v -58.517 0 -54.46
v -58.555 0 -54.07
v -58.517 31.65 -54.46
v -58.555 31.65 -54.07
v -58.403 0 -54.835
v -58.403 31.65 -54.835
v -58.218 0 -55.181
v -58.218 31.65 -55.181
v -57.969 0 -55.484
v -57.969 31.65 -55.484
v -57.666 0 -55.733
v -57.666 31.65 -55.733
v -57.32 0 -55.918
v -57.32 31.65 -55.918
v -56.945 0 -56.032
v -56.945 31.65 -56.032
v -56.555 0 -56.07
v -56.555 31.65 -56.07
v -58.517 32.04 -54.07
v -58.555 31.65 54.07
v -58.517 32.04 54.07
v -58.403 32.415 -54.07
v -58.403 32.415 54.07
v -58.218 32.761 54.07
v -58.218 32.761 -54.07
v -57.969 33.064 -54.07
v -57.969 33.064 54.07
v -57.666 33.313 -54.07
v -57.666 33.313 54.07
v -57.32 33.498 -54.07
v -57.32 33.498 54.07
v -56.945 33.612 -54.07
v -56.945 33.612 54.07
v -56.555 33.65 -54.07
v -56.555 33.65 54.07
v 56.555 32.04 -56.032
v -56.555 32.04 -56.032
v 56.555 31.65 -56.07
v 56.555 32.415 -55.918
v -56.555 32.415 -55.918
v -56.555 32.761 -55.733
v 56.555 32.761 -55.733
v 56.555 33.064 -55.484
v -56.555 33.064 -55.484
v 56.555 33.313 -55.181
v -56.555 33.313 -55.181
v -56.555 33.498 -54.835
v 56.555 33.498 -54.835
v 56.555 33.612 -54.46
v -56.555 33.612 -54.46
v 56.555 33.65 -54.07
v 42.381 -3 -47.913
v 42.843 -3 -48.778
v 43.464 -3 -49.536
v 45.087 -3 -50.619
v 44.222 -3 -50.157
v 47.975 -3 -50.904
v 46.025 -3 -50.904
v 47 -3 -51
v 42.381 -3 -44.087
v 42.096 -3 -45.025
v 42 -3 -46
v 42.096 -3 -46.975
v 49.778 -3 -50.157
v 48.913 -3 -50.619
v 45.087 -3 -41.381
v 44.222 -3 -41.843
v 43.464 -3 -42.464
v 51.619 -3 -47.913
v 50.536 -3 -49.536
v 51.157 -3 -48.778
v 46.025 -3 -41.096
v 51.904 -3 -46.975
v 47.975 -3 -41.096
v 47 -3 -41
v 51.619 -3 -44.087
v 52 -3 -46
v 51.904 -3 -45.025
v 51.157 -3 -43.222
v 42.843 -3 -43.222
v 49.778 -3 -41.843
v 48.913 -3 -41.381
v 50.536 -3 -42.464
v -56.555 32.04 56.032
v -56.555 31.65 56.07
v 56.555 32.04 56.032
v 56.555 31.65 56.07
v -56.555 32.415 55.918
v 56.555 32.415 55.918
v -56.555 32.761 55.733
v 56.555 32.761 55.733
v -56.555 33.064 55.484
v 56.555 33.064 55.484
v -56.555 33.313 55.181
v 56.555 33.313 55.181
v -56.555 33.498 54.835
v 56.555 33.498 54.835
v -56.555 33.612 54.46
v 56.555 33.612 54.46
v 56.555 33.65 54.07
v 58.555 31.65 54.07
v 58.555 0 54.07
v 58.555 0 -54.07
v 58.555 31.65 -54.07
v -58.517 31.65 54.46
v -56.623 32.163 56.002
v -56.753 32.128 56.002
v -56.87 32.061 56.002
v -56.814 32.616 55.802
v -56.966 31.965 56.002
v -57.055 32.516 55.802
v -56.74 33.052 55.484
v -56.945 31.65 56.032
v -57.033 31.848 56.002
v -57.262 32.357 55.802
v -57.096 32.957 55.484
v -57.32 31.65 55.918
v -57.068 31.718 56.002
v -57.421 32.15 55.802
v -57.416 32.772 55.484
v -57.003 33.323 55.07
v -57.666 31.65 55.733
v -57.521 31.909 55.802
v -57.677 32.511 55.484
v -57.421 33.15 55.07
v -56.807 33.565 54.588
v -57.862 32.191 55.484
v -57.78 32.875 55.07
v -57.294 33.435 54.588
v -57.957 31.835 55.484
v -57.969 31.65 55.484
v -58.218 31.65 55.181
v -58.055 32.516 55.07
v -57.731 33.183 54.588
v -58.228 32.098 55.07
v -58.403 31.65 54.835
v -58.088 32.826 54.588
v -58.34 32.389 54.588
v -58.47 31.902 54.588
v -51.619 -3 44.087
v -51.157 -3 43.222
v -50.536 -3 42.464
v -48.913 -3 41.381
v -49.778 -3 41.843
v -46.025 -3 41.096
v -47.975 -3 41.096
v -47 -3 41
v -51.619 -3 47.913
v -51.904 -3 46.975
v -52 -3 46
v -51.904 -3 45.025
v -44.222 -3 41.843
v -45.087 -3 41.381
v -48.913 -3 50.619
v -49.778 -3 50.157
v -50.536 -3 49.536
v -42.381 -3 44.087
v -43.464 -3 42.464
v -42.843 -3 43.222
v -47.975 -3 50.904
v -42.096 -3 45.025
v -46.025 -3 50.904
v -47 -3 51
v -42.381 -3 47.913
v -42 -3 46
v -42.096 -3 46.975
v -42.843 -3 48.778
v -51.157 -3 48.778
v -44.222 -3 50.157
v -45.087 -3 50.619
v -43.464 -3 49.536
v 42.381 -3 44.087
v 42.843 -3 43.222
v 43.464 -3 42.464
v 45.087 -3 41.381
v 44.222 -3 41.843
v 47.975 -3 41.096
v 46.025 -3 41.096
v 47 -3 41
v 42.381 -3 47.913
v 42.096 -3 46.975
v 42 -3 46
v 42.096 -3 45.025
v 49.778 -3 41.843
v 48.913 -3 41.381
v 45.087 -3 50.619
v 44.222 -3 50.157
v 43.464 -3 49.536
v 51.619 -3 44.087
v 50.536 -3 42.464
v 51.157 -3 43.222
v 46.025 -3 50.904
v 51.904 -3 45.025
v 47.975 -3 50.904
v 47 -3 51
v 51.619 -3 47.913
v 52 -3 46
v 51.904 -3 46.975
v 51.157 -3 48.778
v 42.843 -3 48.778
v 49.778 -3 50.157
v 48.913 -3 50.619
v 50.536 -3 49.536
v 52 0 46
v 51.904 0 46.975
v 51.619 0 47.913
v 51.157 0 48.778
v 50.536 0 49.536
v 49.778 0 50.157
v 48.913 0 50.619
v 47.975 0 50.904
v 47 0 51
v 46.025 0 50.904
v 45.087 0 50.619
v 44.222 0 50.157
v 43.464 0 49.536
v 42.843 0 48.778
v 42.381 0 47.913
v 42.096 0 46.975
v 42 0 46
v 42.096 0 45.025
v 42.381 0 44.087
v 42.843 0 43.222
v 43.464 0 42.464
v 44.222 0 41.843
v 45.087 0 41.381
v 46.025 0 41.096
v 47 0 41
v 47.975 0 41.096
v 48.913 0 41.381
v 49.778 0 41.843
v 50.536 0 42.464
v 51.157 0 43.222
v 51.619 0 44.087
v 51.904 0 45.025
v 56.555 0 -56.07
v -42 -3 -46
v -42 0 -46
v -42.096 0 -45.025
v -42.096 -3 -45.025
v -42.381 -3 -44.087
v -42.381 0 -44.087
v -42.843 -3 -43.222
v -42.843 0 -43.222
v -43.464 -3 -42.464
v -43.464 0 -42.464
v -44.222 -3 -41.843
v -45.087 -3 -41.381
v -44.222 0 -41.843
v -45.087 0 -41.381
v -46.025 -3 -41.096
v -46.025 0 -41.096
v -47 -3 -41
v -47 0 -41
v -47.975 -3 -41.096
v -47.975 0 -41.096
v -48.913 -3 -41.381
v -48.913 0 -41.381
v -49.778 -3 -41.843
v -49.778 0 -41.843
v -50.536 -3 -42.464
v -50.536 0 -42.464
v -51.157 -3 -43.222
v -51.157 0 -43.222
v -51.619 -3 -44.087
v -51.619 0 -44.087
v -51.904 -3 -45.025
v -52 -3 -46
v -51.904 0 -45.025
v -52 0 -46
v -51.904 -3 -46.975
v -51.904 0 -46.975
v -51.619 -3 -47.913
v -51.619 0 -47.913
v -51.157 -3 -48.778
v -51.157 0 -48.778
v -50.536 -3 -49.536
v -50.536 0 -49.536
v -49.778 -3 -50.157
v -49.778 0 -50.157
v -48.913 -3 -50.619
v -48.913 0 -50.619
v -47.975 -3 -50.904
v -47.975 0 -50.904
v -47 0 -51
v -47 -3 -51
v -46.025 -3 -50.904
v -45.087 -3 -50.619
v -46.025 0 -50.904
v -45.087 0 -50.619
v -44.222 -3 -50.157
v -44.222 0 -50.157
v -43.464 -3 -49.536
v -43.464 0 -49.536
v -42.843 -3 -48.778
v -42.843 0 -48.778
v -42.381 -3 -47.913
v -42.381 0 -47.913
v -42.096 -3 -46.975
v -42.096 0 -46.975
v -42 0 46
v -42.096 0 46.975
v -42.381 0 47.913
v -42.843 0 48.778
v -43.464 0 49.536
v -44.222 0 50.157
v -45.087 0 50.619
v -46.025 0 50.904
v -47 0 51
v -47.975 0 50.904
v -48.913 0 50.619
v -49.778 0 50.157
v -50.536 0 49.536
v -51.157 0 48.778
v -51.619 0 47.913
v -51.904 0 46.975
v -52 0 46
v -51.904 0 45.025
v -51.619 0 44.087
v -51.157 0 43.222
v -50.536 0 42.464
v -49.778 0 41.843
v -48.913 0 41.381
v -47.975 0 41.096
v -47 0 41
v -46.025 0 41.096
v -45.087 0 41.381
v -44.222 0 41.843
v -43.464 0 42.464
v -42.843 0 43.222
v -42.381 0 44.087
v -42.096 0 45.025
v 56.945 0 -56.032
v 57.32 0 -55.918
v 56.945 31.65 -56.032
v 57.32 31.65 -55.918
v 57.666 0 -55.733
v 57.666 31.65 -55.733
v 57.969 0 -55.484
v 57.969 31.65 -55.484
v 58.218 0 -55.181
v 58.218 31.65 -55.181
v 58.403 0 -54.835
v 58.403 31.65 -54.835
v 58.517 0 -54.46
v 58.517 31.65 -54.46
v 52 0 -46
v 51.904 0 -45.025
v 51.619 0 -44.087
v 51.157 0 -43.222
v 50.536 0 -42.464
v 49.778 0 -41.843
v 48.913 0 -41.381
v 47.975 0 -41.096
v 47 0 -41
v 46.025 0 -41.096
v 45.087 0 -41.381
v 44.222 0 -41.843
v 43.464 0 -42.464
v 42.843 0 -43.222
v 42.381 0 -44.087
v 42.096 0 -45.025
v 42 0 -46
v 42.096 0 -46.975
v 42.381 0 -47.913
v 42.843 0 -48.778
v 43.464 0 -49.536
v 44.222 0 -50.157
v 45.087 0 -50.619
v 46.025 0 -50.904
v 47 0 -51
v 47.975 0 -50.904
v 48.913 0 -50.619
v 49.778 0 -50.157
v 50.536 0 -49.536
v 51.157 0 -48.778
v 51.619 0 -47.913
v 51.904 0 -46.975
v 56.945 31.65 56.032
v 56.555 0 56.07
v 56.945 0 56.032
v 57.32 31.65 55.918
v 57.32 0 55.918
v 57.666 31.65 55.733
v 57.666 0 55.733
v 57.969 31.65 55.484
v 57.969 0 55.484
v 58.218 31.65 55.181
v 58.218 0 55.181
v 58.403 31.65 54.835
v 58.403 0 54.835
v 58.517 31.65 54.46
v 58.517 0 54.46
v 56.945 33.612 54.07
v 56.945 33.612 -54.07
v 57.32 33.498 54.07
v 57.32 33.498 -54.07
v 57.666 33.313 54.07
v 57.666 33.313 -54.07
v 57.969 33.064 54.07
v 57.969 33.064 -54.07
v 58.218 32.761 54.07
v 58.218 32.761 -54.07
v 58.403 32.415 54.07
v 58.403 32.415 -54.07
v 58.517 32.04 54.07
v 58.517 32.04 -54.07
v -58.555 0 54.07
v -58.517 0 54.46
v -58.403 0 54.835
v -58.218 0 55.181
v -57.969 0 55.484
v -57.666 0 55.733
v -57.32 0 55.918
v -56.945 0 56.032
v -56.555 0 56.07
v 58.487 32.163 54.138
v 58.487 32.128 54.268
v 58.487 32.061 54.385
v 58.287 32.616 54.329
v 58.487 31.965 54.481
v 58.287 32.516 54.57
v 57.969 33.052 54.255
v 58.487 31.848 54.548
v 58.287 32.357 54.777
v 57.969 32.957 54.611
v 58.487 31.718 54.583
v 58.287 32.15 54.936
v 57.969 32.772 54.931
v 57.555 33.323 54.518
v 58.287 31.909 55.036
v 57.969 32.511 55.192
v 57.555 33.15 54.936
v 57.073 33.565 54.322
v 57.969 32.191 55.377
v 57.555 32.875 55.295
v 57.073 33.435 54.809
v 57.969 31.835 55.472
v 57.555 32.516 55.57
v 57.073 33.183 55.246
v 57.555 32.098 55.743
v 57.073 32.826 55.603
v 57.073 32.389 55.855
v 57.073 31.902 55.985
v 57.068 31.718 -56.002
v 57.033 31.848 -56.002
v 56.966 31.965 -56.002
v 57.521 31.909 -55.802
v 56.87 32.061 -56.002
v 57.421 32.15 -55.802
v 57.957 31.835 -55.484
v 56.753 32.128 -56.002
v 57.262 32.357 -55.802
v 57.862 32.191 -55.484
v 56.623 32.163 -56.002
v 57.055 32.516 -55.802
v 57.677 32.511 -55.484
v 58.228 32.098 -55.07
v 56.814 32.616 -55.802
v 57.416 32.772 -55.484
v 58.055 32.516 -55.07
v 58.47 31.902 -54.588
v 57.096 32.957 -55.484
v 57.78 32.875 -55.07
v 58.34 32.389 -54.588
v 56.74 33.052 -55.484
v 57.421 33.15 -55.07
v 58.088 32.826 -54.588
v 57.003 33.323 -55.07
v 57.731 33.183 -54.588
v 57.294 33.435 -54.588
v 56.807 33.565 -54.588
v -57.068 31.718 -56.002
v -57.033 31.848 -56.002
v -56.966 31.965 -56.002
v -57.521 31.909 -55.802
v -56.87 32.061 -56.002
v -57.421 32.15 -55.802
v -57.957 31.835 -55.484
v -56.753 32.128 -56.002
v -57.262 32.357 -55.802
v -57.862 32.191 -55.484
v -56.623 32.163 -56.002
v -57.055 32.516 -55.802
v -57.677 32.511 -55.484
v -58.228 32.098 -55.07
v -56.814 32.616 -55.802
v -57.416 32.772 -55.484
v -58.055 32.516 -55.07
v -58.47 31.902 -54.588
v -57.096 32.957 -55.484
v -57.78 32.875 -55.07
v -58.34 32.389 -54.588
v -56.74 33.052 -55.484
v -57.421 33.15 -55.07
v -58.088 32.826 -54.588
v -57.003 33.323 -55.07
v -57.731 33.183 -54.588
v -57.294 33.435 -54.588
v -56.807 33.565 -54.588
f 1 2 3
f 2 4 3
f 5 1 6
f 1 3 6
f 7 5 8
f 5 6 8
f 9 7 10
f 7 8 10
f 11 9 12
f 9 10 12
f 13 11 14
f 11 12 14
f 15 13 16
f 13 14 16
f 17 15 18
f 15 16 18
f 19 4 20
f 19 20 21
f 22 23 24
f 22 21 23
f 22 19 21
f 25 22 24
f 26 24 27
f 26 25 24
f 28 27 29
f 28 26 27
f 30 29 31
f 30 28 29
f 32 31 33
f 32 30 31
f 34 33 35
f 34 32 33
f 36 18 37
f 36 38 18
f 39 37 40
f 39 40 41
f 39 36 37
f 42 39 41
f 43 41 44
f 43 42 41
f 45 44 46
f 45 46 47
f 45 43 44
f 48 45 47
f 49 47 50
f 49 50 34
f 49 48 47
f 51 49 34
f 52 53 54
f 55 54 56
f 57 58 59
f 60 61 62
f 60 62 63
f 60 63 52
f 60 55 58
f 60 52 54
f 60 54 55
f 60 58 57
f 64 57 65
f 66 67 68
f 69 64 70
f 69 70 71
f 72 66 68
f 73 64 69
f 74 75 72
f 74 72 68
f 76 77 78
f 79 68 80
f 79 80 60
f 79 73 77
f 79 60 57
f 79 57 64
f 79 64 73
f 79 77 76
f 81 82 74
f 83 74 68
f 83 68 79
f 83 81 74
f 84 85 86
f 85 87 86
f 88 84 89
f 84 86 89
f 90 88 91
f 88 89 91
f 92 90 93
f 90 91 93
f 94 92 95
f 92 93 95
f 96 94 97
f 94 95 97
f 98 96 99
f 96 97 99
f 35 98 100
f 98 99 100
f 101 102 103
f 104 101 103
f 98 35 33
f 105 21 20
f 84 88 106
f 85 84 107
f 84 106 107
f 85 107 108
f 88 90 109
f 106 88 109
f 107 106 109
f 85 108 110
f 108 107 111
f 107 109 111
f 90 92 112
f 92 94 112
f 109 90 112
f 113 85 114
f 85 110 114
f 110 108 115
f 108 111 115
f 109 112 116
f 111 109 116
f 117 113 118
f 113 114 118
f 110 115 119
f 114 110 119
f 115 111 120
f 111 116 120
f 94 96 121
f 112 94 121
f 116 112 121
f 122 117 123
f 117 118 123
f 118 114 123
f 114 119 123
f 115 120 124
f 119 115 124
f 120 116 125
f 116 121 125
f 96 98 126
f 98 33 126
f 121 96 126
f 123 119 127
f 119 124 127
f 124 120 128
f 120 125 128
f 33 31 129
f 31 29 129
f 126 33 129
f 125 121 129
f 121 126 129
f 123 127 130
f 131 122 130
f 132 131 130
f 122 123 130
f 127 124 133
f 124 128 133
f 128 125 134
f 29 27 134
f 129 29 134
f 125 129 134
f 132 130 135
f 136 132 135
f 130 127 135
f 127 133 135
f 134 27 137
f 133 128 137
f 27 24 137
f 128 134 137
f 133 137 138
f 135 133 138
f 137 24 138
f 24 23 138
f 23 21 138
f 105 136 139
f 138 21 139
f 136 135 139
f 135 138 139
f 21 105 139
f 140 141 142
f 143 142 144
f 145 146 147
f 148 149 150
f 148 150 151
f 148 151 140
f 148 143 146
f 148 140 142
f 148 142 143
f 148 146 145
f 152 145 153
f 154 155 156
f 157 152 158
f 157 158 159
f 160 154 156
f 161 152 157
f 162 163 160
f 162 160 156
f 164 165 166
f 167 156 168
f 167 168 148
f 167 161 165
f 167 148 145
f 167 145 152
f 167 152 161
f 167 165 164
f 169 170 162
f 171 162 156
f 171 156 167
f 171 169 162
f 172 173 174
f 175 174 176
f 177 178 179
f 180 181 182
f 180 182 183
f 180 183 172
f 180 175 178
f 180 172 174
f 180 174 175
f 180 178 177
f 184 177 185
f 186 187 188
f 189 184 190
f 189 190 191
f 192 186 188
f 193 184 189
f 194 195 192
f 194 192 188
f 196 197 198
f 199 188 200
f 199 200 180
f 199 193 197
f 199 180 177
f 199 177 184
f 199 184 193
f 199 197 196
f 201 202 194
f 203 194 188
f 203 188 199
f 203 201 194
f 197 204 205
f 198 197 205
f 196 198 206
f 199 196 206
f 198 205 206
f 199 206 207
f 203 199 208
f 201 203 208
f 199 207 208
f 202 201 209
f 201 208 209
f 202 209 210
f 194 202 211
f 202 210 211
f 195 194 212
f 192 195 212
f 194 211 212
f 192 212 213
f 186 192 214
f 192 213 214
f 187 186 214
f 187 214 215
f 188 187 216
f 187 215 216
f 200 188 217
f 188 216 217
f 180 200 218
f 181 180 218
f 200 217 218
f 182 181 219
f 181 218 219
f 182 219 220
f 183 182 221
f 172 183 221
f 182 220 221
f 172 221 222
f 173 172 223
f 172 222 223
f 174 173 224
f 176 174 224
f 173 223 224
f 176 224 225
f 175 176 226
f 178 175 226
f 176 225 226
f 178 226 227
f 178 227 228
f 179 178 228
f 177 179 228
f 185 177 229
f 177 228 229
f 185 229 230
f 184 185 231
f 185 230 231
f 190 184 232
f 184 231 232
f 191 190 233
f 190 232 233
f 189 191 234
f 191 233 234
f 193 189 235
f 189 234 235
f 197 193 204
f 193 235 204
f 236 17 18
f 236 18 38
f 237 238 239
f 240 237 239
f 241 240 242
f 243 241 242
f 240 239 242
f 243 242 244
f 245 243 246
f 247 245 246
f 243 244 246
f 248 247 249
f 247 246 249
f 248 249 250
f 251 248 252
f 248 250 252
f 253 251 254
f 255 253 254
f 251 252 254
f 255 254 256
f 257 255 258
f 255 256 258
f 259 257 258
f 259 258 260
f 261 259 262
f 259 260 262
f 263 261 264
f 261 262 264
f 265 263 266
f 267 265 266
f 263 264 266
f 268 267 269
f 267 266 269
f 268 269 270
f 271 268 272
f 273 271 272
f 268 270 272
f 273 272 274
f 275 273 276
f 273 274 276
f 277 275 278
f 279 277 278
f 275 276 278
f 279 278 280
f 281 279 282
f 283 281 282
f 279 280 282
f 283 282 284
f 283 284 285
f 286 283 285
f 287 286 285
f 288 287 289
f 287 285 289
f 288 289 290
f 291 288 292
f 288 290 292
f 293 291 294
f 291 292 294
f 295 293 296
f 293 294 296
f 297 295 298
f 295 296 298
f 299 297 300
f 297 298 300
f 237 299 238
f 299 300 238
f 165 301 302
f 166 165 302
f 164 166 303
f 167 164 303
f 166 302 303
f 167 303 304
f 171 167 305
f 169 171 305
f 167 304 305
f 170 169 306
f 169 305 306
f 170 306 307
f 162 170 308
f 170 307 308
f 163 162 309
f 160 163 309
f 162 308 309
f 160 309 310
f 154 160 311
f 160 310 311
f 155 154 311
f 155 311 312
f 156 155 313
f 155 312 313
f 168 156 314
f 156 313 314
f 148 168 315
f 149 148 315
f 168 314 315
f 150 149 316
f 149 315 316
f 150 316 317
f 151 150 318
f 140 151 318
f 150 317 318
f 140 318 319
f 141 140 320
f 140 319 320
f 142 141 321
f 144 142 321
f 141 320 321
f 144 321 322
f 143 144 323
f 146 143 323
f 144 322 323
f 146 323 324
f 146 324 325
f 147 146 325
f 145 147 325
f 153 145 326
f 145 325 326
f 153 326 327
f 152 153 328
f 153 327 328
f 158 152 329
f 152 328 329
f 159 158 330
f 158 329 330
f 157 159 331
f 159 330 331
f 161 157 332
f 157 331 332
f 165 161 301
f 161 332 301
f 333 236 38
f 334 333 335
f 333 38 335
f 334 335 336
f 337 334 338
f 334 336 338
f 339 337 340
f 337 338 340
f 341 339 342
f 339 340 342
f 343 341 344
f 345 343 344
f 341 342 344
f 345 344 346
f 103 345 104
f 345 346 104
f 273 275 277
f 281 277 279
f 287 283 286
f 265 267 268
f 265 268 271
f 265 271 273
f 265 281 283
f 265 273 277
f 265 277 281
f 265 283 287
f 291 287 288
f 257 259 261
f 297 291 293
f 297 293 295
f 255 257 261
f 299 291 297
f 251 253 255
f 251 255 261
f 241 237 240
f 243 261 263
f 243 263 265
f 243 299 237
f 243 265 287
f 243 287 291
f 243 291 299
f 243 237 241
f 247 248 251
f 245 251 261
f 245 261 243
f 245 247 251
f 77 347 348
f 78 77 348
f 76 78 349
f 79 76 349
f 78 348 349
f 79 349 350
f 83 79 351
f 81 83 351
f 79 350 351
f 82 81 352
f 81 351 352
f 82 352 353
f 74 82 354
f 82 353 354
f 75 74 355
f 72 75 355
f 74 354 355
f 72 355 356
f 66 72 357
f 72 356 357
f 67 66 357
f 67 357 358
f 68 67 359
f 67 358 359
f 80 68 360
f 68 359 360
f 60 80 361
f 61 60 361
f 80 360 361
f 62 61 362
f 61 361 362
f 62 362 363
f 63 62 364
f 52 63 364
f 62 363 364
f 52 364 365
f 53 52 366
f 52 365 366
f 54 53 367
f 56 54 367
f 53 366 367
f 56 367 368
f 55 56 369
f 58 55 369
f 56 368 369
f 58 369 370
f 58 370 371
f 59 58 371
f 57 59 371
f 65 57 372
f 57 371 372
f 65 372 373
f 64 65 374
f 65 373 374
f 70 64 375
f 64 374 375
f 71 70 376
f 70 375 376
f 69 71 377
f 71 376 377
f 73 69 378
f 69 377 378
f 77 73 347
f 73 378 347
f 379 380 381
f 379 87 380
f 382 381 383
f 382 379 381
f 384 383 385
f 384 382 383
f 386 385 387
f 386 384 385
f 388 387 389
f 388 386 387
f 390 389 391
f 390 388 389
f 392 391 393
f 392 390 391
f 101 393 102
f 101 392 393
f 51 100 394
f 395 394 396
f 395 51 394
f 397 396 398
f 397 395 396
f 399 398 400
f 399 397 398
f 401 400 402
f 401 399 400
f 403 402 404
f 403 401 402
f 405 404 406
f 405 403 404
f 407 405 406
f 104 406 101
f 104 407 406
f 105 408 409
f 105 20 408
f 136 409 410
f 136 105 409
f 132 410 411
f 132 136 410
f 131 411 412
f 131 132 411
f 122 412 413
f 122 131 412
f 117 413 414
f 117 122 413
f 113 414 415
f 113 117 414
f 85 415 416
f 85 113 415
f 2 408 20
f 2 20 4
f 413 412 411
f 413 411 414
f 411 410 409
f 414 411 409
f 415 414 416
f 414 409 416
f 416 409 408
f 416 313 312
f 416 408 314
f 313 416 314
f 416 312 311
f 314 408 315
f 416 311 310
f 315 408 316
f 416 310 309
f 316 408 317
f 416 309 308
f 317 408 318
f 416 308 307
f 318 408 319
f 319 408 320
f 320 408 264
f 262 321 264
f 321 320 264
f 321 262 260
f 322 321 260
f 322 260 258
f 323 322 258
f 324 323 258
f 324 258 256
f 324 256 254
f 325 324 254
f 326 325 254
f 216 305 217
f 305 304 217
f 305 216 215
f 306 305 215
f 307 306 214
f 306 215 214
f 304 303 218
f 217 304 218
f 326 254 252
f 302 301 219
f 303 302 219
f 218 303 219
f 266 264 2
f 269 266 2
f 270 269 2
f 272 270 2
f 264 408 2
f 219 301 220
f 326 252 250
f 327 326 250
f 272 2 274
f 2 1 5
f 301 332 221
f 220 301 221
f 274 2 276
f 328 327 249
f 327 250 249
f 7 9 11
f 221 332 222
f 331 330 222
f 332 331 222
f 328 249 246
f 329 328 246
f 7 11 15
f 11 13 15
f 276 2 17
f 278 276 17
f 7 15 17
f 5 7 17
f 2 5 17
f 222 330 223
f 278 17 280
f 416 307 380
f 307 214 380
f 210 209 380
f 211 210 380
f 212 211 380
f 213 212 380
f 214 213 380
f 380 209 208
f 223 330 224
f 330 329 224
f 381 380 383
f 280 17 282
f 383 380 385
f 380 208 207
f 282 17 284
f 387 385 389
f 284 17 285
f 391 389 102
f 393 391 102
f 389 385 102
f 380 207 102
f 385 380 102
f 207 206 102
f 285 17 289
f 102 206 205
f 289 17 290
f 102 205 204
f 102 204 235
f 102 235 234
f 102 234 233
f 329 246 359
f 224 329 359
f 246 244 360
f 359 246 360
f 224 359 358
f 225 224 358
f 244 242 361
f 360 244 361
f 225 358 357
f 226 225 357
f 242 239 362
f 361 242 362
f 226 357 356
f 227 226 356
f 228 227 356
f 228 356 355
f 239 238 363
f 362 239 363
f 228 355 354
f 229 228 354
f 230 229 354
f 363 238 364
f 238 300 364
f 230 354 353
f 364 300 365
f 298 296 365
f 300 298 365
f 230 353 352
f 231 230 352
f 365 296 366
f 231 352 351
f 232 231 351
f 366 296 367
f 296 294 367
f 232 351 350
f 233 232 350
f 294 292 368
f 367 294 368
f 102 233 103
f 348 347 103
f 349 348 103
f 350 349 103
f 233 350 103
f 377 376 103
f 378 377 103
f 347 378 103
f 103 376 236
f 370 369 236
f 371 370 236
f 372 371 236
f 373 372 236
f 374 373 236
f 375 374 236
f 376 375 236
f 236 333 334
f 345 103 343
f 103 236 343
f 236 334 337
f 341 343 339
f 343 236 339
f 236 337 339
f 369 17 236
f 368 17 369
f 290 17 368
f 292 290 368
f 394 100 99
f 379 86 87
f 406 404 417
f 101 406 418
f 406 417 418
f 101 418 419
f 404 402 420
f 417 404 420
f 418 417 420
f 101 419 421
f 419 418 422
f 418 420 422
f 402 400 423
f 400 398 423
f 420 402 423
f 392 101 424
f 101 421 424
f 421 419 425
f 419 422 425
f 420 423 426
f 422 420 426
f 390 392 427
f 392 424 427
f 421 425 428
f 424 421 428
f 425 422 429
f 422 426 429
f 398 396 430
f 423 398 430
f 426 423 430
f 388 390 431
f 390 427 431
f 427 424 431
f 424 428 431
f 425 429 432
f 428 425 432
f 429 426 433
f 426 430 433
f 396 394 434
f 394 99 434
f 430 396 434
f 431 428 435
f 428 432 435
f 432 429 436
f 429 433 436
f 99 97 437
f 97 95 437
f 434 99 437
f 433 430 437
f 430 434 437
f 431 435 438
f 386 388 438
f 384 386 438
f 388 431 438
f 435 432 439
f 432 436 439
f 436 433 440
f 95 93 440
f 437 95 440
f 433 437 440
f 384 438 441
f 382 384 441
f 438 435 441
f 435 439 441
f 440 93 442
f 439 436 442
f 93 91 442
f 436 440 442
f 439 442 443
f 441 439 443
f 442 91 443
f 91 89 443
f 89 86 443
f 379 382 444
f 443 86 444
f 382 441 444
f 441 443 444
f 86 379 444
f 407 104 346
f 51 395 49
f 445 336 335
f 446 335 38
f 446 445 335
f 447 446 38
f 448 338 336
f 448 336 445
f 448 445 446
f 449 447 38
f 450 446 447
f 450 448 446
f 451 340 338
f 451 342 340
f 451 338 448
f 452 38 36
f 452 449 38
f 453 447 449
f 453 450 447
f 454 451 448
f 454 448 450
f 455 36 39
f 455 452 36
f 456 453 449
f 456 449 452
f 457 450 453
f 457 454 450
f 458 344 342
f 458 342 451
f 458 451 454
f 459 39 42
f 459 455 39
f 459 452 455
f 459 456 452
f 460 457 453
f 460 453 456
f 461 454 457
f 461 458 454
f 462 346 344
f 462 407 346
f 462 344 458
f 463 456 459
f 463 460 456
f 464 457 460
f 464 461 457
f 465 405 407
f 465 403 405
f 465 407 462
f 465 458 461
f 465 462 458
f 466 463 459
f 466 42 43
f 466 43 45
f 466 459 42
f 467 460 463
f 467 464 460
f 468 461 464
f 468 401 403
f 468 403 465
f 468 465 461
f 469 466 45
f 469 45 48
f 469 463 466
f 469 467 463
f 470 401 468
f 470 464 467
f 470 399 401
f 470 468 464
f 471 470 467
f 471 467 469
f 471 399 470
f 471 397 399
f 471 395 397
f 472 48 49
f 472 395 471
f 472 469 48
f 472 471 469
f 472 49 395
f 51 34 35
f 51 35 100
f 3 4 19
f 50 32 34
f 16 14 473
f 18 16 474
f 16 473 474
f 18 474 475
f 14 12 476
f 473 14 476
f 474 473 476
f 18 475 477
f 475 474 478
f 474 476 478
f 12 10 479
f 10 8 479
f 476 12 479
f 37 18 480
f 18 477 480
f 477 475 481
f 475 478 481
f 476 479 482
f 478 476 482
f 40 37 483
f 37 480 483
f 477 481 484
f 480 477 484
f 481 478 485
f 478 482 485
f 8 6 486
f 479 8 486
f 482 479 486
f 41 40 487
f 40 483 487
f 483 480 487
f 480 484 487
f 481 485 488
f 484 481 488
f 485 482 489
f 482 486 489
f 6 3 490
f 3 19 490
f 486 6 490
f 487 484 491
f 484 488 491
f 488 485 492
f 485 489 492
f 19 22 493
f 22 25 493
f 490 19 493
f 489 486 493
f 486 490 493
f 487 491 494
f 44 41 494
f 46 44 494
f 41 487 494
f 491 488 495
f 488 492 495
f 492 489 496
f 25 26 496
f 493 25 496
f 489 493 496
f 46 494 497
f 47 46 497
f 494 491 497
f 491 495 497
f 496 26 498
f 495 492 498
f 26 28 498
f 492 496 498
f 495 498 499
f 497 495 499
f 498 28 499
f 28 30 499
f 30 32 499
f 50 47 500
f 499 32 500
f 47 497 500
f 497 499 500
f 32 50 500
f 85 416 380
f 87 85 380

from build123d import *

# Parameters (mm, degrees)
SKETCH_1_W      = 117.11
SKETCH_1_H      = 112.14
EXTRUDE_1_DEPTH = 33.65
SKETCH_2_R      = 5
EXTRUDE_2_DEPTH = 3
FILLET_1_R      = 2


with BuildPart() as part:
    # 草图1 → 凸台-拉伸1 (new body)
    with BuildSketch(Plane(origin=(0, 0, 0), x_dir=(1, 0, 0), z_dir=(0, 1, 0))):
        Rectangle(SKETCH_1_W, SKETCH_1_H)
    extrude(amount=EXTRUDE_1_DEPTH)

    # 草图2 → 凸台-拉伸2 (add)
    with BuildSketch(Plane.XZ):
        with Locations((-47, 46)):
            Circle(SKETCH_2_R)
        with Locations((47, 46)):
            Circle(SKETCH_2_R)
        with Locations((47, -46)):
            Circle(SKETCH_2_R)
        with Locations((-47, -46)):
            Circle(SKETCH_2_R)
    extrude(amount=EXTRUDE_2_DEPTH)

    # 圆角1
    fillet_1_edges = [part.edges().sort_by_distance(p)[0] for p in [
        (-58.555, 33.65, 0),
        (0, 33.65, 56.07),
        (58.555, 33.65, 0),
        (58.555, 16.825, 56.07),
        (-58.555, 16.825, 56.07),
        (-58.555, 16.825, -56.07),
        (58.555, 16.825, -56.07),
        (0, 33.65, -56.07),
    ]]
    fillet(fillet_1_edges, radius=FILLET_1_R)


solid = part.part
